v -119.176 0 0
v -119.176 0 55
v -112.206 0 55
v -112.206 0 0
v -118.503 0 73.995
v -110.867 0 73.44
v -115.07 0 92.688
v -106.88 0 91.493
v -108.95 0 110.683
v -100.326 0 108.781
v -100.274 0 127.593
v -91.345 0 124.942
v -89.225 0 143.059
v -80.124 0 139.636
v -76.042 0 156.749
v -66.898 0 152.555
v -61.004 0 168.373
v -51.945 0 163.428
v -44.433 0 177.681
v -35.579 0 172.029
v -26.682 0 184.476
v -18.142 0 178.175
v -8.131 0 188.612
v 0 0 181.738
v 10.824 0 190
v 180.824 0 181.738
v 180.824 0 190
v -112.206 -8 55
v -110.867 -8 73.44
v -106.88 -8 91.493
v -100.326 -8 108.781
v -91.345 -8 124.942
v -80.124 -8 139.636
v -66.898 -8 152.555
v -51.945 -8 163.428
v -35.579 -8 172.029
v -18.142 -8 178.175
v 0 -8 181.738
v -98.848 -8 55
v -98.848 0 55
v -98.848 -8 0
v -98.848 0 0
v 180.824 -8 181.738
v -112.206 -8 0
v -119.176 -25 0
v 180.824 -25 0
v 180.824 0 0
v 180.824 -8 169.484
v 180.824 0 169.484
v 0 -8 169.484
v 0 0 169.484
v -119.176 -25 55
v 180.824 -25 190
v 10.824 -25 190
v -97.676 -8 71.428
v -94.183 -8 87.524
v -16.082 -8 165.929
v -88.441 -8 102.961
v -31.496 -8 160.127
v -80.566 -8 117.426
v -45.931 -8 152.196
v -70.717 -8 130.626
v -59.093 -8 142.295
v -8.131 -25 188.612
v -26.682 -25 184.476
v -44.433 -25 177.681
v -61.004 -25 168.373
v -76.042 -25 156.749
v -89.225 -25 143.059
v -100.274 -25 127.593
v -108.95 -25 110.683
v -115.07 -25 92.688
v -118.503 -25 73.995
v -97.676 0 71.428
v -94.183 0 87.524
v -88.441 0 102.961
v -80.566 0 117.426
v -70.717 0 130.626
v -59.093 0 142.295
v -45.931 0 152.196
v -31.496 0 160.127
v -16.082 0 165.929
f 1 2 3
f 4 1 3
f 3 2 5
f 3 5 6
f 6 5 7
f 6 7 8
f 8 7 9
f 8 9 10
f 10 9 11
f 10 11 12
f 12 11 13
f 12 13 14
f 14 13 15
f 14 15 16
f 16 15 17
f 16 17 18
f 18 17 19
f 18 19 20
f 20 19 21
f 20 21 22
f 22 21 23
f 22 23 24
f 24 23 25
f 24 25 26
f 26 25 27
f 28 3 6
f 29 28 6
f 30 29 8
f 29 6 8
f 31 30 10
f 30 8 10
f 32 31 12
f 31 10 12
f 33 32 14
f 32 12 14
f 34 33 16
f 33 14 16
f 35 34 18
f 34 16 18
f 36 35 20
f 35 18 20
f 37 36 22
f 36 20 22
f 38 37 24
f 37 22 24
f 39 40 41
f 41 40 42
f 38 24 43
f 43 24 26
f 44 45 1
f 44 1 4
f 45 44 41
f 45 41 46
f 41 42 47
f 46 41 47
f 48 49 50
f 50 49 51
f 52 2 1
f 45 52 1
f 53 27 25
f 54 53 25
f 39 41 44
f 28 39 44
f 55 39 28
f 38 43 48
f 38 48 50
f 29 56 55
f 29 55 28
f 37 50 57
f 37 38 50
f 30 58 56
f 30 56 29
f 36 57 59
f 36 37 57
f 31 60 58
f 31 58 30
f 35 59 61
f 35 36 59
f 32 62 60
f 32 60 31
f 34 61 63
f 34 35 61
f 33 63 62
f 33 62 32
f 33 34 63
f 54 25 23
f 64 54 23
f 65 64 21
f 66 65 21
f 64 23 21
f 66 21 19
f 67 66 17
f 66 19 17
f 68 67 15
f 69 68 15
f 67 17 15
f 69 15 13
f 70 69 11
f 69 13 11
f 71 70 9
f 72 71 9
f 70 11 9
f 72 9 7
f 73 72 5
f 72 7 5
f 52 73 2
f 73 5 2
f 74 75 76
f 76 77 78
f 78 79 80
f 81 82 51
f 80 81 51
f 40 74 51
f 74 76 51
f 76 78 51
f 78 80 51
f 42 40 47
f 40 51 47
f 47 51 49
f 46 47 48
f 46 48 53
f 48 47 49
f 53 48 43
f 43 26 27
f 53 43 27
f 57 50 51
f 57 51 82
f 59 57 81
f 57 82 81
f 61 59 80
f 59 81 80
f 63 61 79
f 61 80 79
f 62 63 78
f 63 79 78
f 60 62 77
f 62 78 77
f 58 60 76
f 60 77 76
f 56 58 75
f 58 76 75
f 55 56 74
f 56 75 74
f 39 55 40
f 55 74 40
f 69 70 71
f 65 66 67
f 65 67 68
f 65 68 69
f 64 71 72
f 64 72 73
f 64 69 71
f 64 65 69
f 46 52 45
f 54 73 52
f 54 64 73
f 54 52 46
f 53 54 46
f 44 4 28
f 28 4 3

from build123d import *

# Parameters (mm, degrees)
F1_DEPTH = 25
F3_DEPTH = 8


with BuildPart() as f1:
    # F0 (on Front) → F1 (new body)
    with BuildSketch(Plane.XZ):
        with BuildLine():
            Line((-119.175632, 55), (-119.175632, 0))
            Line((-119.175632, 0), (180.824368, 0))
            Line((180.824368, 0), (180.824368, 190))
            Line((180.824368, 190), (10.824368, 190))
            ThreePointArc((10.824368, 190), (-82.883956, 150.145053), (-119.175632, 55))
        make_face()
    extrude(amount=F1_DEPTH)

    # F2 (on face) → F3 (cut)
    with BuildSketch(Plane(origin=(0, 0, 0), x_dir=(-1, 0, 0), z_dir=(0, 1, 0))):
        with BuildLine():
            Line((0, 181.738123), (-180.824368, 181.738123))
            Line((-180.824368, 181.738123), (-180.824368, 169.483781))
            Line((-180.824368, 169.483781), (0, 169.483781))
            ThreePointArc((0, 169.483781), (70.716626, 130.626464), (98.847926, 55))
            Line((98.847926, 55), (98.847926, 0))
            Line((98.847926, 0), (112.206072, 0))
            Line((112.206072, 0), (112.206072, 55))
            ThreePointArc((112.206072, 55), (80.123875, 139.635623), (0, 181.738123))
        make_face()
    extrude(amount=-F3_DEPTH, mode=Mode.SUBTRACT)


solid = f1.part
